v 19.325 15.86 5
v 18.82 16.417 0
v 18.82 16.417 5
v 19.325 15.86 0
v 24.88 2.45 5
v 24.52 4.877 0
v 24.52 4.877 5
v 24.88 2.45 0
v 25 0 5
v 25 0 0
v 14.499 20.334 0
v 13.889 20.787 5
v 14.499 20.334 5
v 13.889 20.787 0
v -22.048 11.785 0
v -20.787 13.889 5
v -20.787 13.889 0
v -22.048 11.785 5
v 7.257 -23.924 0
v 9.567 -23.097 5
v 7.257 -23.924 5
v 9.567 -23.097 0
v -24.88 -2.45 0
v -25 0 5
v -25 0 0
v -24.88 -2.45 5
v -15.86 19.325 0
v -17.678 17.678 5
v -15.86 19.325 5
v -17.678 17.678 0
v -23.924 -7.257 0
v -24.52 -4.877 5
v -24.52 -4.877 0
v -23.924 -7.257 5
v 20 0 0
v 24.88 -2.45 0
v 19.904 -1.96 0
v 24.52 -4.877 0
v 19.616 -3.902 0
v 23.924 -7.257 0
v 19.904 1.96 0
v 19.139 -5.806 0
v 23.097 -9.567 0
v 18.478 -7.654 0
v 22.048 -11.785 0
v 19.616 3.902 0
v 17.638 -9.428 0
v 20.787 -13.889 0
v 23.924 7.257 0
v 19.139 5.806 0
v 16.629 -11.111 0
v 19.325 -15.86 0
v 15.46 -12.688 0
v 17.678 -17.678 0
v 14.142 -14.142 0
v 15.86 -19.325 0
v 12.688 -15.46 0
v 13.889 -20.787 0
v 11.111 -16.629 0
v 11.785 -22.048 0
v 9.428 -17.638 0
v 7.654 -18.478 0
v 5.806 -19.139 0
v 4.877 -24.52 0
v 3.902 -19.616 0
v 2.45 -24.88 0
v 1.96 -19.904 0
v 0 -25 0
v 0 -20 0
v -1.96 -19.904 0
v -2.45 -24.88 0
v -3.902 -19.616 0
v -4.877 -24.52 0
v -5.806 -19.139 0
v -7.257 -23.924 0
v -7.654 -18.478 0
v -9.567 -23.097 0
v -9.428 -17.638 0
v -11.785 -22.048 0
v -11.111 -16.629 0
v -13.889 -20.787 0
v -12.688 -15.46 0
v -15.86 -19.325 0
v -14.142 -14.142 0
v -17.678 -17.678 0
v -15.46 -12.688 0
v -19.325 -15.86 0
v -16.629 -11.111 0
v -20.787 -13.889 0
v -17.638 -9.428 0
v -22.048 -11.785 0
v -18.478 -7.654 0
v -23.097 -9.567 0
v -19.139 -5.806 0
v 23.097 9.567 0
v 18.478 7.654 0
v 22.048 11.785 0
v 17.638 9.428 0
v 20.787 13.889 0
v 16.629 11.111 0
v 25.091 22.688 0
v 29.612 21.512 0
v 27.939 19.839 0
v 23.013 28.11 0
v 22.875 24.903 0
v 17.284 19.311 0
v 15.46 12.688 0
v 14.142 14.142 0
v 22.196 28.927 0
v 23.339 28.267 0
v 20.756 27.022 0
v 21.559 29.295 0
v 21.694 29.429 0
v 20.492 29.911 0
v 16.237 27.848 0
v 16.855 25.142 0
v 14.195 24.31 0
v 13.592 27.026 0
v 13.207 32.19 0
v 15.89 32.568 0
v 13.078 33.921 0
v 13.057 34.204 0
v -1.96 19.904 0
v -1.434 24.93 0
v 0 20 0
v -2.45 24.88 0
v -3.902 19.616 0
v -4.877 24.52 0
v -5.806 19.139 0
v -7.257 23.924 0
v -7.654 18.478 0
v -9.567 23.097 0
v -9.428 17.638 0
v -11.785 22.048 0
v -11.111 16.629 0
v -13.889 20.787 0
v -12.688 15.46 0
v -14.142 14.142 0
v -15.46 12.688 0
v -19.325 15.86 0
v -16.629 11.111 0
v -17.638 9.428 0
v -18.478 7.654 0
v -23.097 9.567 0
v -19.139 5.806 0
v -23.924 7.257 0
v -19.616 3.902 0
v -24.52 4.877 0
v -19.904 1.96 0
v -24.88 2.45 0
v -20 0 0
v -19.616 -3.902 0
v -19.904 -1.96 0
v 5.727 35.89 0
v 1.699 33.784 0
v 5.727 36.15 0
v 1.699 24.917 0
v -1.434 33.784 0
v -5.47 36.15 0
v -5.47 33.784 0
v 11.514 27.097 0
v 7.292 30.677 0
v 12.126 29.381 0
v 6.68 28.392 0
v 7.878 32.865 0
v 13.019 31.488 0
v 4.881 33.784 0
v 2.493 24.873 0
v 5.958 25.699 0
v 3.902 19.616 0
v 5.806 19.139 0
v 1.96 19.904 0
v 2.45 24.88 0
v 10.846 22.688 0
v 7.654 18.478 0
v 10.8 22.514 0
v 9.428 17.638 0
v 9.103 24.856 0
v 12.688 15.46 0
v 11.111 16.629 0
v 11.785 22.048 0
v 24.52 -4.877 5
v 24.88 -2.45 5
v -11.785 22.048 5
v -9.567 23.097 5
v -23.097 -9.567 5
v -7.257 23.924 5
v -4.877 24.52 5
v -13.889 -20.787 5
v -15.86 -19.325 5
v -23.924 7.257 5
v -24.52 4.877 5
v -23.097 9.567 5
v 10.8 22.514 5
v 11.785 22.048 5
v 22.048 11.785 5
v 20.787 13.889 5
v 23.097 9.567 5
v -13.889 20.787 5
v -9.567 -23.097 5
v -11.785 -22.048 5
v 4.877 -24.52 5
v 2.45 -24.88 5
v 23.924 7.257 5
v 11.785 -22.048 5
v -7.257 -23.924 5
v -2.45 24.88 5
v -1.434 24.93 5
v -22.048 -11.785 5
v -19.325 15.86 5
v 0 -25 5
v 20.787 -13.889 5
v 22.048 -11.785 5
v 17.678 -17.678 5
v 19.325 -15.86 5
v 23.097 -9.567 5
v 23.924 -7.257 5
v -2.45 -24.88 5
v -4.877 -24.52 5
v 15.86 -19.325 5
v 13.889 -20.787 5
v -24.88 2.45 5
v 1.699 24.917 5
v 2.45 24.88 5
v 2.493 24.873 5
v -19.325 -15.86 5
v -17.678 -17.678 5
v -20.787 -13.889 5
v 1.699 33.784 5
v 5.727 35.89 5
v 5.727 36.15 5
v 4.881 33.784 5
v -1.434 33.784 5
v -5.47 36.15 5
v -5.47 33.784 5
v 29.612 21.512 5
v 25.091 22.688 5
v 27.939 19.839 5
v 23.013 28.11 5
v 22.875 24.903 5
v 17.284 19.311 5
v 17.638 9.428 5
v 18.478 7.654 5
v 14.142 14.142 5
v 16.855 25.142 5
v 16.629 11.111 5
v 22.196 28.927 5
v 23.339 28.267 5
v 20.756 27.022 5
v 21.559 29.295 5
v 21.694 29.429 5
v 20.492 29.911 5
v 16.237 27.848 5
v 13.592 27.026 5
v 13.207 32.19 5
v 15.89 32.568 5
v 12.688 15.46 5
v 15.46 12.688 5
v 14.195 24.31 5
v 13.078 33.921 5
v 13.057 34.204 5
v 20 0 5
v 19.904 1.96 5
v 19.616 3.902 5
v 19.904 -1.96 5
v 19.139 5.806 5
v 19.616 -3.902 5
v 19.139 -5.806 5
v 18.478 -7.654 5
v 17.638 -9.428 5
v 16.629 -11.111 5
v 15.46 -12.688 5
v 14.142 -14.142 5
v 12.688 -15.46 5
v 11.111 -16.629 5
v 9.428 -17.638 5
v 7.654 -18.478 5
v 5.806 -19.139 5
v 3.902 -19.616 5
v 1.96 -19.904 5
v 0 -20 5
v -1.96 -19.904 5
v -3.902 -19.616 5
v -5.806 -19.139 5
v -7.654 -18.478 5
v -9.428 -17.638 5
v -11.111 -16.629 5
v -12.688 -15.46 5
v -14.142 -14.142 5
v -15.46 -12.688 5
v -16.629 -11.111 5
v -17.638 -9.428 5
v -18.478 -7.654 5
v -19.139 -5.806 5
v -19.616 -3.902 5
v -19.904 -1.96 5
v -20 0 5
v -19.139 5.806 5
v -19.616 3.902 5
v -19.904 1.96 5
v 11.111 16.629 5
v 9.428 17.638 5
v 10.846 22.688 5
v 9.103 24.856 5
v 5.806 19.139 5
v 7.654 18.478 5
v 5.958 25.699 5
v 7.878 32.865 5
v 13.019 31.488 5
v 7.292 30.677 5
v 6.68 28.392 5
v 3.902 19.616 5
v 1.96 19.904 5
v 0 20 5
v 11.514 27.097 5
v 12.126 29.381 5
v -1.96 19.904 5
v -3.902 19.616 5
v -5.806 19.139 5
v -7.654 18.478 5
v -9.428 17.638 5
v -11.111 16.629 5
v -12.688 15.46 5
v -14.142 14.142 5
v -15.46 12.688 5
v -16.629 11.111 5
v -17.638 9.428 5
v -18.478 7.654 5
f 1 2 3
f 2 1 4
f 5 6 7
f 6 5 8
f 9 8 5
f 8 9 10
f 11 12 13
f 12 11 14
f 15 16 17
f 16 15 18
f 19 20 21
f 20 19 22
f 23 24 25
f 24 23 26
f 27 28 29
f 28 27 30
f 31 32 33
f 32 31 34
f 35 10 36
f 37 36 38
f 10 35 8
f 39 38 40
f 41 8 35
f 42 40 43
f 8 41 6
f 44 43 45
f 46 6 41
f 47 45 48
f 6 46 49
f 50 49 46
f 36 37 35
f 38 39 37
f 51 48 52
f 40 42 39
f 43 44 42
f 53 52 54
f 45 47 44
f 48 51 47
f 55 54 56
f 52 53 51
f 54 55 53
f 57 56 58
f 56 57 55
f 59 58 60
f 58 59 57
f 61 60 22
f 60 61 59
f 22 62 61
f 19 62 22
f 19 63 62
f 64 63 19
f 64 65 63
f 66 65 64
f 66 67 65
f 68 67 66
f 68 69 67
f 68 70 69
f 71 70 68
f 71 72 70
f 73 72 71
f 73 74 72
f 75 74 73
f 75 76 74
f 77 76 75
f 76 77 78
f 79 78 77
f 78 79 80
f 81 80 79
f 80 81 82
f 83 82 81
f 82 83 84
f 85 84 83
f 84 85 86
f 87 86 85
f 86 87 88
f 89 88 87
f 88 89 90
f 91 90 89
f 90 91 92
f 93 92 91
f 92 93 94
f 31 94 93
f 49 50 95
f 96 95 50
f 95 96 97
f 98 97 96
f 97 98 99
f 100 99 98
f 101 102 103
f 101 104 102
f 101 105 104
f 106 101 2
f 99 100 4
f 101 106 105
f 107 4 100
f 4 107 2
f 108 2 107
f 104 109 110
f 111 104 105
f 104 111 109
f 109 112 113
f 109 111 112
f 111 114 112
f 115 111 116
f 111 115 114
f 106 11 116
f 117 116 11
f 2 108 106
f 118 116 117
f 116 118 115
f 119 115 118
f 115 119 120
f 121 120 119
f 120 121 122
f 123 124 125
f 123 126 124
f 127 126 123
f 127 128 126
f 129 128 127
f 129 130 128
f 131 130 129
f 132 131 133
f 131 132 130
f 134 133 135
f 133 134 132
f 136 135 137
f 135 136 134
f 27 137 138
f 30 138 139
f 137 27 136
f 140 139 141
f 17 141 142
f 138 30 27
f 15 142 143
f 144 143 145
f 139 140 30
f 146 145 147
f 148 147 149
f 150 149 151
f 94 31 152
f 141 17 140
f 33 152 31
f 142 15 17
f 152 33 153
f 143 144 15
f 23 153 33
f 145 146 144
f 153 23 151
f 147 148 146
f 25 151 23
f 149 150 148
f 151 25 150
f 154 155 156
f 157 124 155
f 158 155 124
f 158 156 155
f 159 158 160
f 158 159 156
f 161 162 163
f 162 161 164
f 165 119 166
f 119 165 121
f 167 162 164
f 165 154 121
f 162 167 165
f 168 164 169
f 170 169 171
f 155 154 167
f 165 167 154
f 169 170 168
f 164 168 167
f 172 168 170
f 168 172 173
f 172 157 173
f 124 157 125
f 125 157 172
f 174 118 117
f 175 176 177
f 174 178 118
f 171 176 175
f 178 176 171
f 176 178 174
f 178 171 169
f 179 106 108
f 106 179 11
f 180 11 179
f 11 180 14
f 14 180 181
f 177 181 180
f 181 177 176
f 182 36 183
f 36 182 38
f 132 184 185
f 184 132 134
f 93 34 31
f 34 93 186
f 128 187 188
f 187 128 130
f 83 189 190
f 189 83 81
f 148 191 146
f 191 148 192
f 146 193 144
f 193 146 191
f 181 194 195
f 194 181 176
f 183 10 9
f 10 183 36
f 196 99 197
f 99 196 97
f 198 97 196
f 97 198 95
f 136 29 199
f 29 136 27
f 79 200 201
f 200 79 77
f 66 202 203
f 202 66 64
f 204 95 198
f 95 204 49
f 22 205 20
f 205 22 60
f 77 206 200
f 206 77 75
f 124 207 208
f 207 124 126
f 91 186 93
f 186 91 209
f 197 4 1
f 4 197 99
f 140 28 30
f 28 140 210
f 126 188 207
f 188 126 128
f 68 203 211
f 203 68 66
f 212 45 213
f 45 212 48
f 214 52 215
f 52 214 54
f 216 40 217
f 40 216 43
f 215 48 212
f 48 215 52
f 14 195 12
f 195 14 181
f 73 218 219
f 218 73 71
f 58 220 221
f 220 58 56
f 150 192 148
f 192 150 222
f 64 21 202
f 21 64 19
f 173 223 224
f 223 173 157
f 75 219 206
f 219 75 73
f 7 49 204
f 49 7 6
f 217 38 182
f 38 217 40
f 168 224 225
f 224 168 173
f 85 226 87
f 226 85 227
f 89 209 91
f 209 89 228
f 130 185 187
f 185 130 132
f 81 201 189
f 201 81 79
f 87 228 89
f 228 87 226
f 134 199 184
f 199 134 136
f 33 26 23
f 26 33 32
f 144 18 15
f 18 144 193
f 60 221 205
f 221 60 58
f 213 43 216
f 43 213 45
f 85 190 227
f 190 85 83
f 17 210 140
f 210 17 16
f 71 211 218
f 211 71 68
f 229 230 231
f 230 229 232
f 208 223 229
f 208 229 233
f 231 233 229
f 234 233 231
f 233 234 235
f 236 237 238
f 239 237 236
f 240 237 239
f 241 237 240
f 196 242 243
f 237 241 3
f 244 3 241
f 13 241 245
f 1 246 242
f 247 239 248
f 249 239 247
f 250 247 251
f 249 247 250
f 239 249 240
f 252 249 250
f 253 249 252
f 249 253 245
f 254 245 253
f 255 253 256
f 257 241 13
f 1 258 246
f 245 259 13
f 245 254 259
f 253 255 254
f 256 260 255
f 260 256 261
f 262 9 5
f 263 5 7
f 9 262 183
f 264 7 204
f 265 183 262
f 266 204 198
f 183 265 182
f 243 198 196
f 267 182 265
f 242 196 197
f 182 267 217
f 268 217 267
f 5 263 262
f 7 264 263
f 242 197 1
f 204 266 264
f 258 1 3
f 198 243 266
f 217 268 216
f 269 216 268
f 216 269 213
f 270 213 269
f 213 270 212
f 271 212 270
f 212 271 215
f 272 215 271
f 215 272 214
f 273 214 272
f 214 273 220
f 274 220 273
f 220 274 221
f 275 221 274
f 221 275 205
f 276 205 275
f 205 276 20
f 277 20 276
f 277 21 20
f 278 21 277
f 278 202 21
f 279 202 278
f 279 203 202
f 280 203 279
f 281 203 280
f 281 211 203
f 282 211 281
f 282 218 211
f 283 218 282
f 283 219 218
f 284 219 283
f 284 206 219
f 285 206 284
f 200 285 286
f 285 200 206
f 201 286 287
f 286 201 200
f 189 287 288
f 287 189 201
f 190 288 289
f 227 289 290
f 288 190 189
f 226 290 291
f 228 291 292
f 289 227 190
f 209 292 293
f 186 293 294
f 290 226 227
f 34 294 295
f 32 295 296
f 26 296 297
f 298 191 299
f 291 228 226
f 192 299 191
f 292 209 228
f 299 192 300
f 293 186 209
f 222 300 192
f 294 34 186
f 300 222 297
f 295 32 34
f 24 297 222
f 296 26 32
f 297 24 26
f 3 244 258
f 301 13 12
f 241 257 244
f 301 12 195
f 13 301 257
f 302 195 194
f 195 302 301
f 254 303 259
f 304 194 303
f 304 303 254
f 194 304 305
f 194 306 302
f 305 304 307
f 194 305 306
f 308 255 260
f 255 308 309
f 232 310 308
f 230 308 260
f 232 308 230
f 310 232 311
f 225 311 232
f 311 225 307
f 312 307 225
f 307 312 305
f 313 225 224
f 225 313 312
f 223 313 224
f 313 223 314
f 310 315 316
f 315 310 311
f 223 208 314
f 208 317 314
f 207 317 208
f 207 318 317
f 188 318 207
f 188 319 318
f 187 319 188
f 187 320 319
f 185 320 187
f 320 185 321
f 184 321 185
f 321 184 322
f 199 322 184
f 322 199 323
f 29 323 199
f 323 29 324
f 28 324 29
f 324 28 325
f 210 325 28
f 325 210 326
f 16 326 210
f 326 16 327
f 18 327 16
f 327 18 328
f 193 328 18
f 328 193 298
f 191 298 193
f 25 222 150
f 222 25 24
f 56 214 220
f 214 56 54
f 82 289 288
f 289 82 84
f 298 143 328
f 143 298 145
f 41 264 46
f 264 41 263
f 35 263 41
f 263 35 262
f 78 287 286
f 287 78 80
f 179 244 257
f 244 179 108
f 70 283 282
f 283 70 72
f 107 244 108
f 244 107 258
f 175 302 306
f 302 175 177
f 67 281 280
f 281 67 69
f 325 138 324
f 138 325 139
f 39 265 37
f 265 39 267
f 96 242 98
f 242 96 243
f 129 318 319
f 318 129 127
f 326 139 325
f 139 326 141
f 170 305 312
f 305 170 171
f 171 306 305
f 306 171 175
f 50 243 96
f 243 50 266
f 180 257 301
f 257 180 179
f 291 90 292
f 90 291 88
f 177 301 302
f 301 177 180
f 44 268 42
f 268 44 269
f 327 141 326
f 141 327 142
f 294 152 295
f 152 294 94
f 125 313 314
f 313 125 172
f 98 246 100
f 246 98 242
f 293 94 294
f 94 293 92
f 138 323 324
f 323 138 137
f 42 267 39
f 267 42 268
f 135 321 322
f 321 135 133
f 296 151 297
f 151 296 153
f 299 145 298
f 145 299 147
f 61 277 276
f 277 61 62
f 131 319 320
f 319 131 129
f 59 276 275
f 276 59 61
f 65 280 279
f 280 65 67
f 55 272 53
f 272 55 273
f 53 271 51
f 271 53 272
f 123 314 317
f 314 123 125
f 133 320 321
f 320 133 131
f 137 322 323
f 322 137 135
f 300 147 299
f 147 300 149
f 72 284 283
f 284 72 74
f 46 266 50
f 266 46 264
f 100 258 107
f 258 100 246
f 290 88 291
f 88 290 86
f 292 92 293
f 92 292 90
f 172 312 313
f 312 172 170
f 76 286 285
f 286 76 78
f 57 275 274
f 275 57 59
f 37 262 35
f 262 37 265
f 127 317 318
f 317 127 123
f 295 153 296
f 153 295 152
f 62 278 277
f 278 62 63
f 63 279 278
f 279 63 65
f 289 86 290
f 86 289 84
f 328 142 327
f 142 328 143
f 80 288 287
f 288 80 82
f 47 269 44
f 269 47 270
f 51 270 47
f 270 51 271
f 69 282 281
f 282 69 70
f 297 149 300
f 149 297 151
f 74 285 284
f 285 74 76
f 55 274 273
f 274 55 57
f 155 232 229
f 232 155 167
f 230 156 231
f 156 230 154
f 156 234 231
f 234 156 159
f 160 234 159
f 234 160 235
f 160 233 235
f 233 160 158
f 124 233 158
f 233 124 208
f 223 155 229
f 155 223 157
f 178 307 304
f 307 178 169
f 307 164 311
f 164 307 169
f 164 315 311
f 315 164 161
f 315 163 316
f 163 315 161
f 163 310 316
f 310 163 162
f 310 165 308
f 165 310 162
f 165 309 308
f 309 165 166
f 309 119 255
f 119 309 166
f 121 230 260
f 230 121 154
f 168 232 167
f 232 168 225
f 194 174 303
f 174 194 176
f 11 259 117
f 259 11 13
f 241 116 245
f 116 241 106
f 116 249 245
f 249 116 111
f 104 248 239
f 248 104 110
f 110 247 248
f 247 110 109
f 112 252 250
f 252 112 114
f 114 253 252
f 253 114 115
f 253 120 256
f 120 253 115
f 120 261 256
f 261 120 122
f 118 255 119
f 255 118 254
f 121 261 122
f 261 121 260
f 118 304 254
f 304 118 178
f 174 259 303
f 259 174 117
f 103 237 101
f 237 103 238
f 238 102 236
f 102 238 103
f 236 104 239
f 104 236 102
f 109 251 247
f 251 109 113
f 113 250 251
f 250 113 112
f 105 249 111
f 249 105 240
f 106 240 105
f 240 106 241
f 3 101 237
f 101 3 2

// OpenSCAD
//CUSTOMIZER VARIABLES

// Name or Text
Text = "TEXT";

// Adjust spacing between letters
Degrees = 15; //  [13,14,15,16,17]

//CUSTOMIZER VARIABLES END

module L_0(char = "A", Degrees = 15, i = 0) {
    rotate([0,0,-Degrees*i])
    translate([0,24,0])
    linear_extrude(height = 5)
    text(size = 12, text = char, font = "Chewy:style=bold", halign = "center", valign= "bottom", $fn = 32);
}

union() {
    difference() {
        cylinder(h = 5, r = 25, $fn = 64);
        translate([0,0,-0.1])
        cylinder(h = 5.2, r = 20, $fn = 64);
    }
    
    union() {
        for (i = [0:len(Text)-1]) {
            L_0(Text[i], Degrees, i);
        }
    }
}
